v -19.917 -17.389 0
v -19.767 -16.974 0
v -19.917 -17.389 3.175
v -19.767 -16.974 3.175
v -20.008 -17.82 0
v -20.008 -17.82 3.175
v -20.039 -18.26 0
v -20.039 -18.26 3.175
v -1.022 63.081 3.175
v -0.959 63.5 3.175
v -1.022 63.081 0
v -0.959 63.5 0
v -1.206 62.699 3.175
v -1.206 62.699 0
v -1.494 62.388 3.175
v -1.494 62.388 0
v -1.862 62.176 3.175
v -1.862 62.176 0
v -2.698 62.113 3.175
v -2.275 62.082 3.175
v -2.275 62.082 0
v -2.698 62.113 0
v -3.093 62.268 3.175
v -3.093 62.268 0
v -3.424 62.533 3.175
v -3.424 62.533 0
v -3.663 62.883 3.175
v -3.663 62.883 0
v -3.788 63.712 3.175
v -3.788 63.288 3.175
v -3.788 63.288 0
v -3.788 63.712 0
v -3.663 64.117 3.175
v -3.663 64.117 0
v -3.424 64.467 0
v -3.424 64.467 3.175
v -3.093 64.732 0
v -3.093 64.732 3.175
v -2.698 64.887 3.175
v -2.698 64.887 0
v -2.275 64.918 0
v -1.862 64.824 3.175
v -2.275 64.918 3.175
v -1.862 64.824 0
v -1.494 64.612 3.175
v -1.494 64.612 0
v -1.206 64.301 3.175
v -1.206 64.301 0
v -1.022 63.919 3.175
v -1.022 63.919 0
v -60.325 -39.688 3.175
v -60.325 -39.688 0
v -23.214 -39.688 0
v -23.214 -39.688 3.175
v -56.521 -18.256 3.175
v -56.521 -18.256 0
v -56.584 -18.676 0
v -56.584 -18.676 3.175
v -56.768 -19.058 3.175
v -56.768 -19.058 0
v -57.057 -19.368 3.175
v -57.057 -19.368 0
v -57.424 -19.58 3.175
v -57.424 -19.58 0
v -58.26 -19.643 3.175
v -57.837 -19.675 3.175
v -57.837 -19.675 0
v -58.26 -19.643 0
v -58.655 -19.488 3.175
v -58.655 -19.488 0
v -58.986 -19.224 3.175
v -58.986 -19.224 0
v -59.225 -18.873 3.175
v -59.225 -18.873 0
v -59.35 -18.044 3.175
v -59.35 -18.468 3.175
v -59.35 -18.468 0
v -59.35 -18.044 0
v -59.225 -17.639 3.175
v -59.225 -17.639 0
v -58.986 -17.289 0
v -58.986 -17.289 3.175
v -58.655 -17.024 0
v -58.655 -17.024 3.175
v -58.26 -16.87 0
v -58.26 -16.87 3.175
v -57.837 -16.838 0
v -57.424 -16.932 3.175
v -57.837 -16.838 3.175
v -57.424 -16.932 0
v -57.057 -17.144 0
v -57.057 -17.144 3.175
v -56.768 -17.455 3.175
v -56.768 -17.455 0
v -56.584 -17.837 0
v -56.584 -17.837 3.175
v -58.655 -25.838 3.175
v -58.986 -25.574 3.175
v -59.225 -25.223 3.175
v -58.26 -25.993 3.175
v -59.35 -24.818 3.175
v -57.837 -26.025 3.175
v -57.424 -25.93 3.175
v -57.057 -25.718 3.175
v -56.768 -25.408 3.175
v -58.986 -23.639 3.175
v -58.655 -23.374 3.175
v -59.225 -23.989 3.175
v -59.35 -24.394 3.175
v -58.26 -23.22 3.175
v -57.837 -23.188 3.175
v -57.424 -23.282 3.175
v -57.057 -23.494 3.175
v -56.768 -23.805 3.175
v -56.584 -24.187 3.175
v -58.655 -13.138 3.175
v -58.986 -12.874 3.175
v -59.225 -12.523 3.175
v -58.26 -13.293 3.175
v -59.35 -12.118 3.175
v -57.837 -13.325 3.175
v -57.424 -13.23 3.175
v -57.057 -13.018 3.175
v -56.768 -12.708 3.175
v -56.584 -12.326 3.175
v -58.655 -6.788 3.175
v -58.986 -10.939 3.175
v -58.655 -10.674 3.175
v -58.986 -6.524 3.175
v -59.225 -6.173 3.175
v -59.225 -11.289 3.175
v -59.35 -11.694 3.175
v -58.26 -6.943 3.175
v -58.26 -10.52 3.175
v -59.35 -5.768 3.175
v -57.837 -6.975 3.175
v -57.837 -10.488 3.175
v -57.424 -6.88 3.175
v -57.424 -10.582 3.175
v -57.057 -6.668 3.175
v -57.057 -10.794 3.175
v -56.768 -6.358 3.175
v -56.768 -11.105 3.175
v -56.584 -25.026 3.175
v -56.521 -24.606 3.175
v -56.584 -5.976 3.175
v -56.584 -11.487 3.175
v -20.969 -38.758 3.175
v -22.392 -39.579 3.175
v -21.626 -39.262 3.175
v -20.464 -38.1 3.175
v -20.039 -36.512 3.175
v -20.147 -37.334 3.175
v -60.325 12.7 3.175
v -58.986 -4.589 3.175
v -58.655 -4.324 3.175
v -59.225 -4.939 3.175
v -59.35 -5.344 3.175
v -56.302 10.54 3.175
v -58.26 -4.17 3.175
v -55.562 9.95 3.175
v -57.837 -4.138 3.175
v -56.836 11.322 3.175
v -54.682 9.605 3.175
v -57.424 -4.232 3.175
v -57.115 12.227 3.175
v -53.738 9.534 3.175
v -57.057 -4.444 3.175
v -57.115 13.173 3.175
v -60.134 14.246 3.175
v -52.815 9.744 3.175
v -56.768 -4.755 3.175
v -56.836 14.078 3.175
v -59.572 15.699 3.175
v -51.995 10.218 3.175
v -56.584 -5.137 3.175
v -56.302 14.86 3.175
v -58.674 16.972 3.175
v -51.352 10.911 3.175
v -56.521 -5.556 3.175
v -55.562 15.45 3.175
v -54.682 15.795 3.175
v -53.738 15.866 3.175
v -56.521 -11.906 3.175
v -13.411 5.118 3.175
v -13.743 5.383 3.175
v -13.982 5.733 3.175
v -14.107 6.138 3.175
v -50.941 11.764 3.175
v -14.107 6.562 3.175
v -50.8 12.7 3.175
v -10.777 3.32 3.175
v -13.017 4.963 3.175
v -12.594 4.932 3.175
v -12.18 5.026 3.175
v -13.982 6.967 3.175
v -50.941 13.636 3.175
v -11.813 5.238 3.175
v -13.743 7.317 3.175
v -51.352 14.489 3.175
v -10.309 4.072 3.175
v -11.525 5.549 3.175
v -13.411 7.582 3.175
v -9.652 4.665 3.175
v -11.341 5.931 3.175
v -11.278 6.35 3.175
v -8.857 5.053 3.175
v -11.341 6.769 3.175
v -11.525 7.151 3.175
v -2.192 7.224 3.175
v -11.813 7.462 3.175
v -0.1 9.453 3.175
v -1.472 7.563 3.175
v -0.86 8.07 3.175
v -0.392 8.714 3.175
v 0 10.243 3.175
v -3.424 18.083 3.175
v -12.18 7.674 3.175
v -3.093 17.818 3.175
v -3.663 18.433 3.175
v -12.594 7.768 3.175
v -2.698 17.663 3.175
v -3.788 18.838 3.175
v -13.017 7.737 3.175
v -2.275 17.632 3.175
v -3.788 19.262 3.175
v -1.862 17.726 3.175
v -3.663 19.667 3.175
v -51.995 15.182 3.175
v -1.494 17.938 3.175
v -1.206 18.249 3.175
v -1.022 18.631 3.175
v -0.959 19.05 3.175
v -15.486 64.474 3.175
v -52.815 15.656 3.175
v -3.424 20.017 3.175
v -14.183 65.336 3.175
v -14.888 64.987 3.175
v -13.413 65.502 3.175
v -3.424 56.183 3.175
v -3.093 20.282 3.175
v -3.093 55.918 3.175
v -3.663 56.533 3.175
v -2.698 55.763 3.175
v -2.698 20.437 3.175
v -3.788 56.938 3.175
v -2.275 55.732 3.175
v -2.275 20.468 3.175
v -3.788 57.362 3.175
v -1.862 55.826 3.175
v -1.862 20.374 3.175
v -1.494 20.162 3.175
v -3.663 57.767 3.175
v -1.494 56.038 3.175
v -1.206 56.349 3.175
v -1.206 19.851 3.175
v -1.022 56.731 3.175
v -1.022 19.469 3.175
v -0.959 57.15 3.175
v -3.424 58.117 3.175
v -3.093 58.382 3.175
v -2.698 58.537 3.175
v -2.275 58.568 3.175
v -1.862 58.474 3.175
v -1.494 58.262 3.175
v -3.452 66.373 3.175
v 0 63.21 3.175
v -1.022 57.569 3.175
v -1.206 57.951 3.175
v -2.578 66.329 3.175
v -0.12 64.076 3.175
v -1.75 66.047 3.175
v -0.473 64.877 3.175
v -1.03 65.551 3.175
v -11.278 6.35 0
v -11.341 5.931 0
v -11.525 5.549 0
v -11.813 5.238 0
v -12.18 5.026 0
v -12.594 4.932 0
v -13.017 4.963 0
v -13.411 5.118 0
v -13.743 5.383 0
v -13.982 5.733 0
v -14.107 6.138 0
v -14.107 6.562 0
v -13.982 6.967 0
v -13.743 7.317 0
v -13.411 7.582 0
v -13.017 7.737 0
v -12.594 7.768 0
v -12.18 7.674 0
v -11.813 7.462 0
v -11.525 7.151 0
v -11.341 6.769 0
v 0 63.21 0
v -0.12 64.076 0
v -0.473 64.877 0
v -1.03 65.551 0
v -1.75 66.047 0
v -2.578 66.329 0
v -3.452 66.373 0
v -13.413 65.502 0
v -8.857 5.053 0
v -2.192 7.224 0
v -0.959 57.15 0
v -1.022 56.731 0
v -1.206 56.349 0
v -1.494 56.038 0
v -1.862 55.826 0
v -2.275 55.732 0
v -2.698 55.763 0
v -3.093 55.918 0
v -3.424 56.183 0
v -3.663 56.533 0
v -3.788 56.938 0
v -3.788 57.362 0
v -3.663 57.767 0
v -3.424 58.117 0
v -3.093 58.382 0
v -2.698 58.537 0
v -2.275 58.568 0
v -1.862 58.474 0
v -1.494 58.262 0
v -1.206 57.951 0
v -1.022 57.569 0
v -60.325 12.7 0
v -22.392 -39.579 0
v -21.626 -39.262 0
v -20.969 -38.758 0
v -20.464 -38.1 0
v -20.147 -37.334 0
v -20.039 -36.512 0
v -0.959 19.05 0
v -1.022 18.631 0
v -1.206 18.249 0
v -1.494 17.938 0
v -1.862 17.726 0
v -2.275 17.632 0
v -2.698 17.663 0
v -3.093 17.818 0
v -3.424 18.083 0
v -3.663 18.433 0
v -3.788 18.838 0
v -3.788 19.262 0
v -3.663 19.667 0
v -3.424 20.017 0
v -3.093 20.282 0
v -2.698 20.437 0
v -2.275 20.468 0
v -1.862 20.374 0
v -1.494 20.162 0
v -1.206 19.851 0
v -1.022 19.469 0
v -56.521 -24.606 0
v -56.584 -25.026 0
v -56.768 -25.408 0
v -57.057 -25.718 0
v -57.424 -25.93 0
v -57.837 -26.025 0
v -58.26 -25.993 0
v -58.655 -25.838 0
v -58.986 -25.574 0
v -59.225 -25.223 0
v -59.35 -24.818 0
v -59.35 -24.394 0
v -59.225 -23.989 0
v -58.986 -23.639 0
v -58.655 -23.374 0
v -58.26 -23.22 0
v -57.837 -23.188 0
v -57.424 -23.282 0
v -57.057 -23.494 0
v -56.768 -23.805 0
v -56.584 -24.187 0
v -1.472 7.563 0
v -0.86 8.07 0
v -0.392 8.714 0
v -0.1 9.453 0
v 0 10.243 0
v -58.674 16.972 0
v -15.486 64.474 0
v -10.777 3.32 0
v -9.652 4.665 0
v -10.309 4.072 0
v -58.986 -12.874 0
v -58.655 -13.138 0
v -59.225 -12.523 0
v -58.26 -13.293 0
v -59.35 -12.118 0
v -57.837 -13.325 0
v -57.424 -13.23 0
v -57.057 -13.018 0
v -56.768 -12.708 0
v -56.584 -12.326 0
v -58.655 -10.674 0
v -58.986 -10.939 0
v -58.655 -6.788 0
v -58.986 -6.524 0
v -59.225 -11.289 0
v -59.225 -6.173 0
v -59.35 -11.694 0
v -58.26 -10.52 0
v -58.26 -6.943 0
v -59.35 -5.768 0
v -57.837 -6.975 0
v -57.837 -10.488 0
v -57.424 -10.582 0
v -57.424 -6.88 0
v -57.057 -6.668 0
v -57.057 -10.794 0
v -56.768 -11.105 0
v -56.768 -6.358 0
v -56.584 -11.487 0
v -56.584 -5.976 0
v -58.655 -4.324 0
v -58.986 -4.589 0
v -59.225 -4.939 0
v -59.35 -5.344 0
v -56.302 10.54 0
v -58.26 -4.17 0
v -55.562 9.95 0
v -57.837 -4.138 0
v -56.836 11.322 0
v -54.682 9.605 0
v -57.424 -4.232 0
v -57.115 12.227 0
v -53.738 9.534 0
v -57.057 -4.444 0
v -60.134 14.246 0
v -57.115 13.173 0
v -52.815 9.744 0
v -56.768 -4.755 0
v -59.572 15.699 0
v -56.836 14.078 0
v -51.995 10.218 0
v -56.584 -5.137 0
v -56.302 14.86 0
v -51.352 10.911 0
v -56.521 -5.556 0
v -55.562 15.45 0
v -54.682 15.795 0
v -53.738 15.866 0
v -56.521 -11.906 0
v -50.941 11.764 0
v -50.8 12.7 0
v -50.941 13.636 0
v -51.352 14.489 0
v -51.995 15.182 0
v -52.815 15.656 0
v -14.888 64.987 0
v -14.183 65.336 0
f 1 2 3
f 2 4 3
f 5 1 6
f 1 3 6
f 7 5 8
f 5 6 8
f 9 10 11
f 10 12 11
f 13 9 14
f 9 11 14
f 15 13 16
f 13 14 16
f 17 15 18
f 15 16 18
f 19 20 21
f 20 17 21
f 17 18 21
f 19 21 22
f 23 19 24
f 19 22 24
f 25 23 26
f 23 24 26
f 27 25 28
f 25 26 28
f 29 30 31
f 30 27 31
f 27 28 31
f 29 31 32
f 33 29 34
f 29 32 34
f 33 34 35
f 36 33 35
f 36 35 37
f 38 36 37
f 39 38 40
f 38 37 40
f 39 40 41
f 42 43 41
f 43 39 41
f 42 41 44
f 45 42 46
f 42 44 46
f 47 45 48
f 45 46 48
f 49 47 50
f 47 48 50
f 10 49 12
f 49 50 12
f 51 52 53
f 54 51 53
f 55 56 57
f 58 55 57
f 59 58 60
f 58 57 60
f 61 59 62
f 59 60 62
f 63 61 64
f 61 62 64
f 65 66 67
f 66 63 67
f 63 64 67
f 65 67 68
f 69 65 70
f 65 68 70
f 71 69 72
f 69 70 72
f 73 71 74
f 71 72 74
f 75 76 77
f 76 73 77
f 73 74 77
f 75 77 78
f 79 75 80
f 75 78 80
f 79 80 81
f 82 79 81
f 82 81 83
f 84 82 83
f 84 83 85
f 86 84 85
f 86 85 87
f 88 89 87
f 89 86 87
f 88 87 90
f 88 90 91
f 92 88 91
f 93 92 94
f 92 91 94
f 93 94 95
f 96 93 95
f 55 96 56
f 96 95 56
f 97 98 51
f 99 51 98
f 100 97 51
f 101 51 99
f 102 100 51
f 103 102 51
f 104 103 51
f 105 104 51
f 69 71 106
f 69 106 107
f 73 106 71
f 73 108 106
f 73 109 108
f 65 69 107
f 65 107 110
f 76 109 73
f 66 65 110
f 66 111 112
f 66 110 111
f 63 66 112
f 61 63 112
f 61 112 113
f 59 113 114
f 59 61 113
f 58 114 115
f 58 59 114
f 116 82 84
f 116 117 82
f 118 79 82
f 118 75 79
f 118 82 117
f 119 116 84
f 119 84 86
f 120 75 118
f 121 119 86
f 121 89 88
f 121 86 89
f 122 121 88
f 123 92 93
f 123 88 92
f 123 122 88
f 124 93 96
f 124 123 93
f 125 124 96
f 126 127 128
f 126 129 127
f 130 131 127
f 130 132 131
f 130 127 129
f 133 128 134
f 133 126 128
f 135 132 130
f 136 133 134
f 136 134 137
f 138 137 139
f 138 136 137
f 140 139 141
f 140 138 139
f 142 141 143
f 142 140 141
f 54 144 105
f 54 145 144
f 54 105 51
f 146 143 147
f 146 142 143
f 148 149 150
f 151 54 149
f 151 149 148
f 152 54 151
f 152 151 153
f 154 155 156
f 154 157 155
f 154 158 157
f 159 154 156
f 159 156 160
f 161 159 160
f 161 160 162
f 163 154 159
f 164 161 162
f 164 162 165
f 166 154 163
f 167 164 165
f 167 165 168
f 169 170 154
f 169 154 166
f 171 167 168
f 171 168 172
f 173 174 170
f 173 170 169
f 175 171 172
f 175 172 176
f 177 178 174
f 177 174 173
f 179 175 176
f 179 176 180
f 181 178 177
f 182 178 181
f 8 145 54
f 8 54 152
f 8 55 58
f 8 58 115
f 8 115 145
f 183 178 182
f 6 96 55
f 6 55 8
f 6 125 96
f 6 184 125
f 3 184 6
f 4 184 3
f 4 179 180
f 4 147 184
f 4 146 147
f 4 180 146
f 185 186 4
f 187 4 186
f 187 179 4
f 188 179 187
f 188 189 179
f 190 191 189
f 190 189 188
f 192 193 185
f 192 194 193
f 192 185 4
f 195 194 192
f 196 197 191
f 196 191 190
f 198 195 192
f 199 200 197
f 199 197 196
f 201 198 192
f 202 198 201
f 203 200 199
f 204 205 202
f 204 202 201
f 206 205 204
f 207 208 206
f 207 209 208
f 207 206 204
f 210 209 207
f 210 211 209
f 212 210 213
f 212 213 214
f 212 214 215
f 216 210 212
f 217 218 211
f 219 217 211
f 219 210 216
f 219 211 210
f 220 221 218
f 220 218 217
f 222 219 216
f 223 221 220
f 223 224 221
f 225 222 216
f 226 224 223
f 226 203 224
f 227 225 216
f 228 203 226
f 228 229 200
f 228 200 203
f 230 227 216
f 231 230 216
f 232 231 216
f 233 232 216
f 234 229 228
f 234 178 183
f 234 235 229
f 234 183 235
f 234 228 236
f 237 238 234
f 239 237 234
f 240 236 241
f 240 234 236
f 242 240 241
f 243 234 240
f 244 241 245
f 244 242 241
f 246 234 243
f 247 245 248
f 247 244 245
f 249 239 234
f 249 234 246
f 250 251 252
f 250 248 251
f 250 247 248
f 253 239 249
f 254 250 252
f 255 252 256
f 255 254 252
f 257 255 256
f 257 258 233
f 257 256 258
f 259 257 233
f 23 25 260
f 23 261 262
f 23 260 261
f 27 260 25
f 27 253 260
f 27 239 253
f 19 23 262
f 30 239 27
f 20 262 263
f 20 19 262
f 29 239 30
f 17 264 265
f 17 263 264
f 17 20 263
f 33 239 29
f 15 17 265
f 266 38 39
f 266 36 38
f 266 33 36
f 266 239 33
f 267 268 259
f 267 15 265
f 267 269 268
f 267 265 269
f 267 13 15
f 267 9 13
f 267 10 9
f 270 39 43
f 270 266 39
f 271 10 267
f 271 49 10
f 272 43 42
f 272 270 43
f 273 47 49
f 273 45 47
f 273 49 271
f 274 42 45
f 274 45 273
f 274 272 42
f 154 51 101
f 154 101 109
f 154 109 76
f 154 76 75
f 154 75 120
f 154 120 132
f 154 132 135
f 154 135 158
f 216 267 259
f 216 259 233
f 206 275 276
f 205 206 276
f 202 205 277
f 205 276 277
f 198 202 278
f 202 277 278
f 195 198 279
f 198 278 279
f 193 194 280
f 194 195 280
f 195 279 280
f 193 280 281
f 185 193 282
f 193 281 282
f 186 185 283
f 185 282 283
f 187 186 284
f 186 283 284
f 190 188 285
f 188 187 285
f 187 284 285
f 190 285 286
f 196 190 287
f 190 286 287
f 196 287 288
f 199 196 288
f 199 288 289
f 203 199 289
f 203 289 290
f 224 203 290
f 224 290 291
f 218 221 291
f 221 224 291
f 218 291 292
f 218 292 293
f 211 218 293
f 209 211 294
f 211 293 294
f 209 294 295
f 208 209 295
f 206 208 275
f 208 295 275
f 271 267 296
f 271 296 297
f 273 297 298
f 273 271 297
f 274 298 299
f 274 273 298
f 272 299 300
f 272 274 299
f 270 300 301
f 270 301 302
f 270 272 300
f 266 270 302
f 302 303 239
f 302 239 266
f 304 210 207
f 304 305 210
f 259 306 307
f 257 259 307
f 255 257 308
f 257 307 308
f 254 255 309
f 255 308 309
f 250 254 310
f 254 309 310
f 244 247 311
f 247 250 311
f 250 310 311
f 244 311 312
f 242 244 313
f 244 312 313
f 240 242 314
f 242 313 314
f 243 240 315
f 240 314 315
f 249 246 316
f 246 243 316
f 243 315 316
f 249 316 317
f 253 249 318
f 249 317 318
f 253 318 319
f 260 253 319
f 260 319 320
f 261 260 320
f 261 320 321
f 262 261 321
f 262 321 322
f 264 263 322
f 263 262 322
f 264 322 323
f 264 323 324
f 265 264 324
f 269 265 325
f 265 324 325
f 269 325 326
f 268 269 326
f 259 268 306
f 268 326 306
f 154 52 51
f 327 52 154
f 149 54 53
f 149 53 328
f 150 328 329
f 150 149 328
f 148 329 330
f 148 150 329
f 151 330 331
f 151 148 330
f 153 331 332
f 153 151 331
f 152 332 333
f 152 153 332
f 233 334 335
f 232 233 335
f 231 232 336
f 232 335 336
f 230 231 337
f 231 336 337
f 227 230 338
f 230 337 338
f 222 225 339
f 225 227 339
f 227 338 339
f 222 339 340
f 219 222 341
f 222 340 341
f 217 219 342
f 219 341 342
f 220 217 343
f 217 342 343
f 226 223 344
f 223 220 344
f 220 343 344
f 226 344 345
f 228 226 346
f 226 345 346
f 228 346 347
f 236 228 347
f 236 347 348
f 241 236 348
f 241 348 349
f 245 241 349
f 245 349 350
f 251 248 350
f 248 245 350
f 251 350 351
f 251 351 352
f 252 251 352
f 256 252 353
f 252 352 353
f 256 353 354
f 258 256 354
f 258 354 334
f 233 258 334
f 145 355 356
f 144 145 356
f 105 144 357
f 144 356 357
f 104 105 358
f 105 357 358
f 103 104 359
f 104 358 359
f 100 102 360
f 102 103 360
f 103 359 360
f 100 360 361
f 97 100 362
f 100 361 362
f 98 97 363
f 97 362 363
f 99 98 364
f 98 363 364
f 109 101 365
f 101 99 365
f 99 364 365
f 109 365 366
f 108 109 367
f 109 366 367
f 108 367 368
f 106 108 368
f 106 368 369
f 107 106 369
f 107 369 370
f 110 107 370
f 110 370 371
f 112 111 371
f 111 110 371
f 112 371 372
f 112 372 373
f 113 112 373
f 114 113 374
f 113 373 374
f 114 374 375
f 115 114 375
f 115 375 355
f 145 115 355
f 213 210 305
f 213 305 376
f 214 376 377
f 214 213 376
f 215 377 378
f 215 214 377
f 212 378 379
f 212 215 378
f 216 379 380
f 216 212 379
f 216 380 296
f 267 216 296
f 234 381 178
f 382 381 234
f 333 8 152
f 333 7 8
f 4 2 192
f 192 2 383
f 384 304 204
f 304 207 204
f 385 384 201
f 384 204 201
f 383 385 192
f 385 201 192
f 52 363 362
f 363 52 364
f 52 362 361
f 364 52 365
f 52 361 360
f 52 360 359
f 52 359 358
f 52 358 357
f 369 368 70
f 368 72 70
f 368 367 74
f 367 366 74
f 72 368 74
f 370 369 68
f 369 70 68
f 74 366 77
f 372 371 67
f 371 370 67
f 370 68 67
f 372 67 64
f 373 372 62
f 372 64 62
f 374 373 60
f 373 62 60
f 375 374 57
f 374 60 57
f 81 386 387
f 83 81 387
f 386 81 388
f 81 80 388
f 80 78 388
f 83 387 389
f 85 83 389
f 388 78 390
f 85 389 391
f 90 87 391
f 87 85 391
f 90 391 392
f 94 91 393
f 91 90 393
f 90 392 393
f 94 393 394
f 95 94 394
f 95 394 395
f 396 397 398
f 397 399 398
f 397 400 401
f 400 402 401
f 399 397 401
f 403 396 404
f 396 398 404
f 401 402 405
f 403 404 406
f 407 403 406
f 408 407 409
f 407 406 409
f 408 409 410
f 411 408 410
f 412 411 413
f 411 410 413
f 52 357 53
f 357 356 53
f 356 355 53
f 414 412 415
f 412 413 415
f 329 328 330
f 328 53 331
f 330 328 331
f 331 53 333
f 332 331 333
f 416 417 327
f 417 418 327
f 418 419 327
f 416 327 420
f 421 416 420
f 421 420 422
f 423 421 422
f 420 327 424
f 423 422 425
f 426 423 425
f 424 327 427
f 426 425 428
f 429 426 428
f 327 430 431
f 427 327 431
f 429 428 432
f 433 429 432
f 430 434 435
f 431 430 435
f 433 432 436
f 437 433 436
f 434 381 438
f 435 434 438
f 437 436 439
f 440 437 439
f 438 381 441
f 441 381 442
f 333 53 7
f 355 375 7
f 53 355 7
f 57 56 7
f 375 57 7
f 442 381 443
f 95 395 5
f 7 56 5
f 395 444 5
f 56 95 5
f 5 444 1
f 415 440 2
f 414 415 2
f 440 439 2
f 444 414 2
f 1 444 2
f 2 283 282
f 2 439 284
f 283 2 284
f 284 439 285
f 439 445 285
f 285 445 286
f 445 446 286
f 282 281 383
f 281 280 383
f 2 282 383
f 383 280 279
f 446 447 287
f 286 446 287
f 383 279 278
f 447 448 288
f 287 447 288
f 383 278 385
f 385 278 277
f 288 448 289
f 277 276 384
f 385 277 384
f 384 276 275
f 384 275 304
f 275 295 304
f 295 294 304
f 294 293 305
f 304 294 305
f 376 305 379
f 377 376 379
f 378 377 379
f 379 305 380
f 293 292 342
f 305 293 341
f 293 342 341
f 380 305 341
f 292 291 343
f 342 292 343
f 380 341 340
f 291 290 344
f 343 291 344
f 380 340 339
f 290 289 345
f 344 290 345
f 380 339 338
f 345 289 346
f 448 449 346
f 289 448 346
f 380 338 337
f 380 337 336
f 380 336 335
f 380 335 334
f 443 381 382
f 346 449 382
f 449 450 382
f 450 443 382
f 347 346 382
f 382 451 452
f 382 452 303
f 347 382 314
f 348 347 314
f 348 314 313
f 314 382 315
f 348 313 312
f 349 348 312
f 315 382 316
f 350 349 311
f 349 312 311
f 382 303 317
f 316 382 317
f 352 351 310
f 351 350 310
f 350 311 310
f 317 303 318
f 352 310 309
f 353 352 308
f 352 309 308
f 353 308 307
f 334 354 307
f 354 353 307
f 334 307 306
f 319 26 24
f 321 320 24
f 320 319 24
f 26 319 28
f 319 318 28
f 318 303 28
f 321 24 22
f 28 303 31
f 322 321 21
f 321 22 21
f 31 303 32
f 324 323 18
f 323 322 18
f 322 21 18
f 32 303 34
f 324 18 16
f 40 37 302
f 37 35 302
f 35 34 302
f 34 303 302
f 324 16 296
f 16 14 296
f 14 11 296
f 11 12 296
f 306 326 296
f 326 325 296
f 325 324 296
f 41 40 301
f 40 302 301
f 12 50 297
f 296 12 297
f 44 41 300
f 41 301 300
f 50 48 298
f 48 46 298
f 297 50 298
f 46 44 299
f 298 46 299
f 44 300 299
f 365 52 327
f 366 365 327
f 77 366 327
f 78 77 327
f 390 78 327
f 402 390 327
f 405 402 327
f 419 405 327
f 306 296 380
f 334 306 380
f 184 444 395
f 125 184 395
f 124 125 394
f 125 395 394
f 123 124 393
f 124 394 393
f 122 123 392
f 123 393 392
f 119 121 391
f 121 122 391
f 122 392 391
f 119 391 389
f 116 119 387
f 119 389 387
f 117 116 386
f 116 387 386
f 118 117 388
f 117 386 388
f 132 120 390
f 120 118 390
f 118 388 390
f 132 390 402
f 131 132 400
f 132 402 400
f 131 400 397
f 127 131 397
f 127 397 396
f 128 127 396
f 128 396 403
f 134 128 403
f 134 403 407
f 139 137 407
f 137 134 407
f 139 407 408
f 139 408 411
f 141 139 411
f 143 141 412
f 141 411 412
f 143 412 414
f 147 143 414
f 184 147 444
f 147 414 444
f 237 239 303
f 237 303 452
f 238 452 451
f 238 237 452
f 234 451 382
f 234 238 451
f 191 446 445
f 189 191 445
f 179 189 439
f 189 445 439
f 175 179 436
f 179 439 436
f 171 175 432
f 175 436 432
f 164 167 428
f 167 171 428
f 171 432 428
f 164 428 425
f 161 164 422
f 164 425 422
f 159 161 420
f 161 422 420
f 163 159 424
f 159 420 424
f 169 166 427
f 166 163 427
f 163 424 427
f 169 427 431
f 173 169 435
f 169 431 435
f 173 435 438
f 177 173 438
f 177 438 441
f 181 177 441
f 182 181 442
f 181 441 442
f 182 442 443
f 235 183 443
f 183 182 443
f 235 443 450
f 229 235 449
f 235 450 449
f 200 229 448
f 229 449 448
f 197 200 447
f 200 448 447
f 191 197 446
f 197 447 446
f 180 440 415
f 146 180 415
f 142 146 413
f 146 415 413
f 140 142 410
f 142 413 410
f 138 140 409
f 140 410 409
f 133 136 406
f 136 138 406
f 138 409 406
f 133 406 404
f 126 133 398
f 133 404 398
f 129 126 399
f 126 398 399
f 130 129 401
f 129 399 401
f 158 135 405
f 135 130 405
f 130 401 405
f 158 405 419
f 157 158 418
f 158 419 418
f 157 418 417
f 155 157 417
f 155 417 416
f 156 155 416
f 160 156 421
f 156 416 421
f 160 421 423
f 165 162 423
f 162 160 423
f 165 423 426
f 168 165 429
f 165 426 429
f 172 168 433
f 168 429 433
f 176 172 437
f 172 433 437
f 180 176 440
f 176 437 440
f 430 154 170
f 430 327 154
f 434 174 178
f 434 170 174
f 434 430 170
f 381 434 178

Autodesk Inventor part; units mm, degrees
ref_plane "YZ Plane" through (0, 0, 0) normal (1, 0, 0) x (0, 1, 0)
ref_plane "XZ Plane" through (0, 0, 0) normal (0, 1, 0) x (-1, 0, 0)
ref_plane "XY Plane" through (0, 0, 0) normal (0, 0, 1) x (1, 0, 0)
sketch "Sketch1" plane through (0, 0, 0) normal (0, 0, 1) x (1, 0, 0)
  line L0 (0, 0) -> (0, 136.525)
  line L1 (-11.7886, 12.2907) -> (-39.6863, 18.4755) construction
  line L2 (-39.6863, 18.4755) -> (-33.3297, 47.1481) construction
  line L3 (-33.3297, 47.1481) -> (-5.432, 40.9633) construction
  line L4 (-5.432, 40.9633) -> (-11.7886, 12.2907) construction
  line L5 (-39.6863, 18.4755) -> (-5.432, 40.9633) construction
  line L6 (-33.3297, 47.1481) -> (-11.7886, 12.2907) construction
  circle A0 centre (-53.975, 12.7) radius 3.175
  circle A1 centre (-53.975, 12.7) radius 6.35
  line L7 (0, 0) -> (-54.712, 6.3929) construction
  line L8 (-59.6703, 15.5082) -> (0, 136.525) construction
  line L9 (-27.1302, 45.7737) -> (-37.4529, 28.5497) construction
  line L10 (-11.6315, 42.3377) -> (-9.5552, 22.3649) construction
  line L11 (-19.3809, 44.0557) -> (-25.7374, 15.3831) construction
  line L12 (0, 92.075) -> (-19.7574, 96.4551) construction
  line L13 (-35.3766, 8.5768) -> (-19.8779, 5.1408) construction
  line L14 (-19.8779, 5.1408) -> (-21.2523, -1.0586) construction
  line L15 (-21.2523, -1.0586) -> (-36.751, 2.3773) construction
  line L16 (-36.751, 2.3773) -> (-35.3766, 8.5768) construction
  line L17 (-35.3766, 8.5768) -> (-41.27, 4.8223) construction
  line L18 (-19.8779, 5.1408) -> (-17.9381, 2.096) construction
  line L19 (-5.432, 40.9633) -> (-33.3297, 47.1481) construction
  line L20 (-33.3297, 47.1481) -> (-32.2475, 52.0296) construction
  line L21 (-32.2475, 52.0296) -> (-4.3498, 45.8448) construction
  line L22 (-4.3498, 45.8448) -> (-5.432, 40.9633) construction
  line L23 (-53.2878, 15.7997) -> (-53.975, 12.7) construction
  line L24 (-53.975, 12.7) -> (-57.0747, 13.3872) construction
  line L25 (-27.6272, 6.8588) -> (-34.4992, -24.1386) construction
  line L26 (-31.8676, 50.076) -> (-5.5198, 44.2349) construction
  line L27 (-5.5198, 44.2349) -> (-4.489, 48.8845) construction
  line L28 (-4.489, 48.8845) -> (-30.8368, 54.7256) construction
  line L29 (-30.8368, 54.7256) -> (-31.8676, 50.076) construction
  line L30 (-31.3522, 52.4008) -> (-5.0044, 46.5597) construction
  circle A2 centre (-29.0274, 51.8854) radius 1.4732 construction
  circle A3 centre (-22.8279, 50.5111) radius 1.4732 construction
  circle A4 centre (-16.6284, 49.1367) radius 1.4732 construction
  circle A5 centre (-10.4289, 47.7623) radius 1.4732 construction
  circle A6 centre (-10.3614, 84.7398) radius 1.4732 construction
  line L31 (-53.975, 12.7) -> (-13.3751, 95.0402) construction
  line L32 (-32.2923, 56.6744) -> (0, 49.5153) construction
  circle A7 centre (-10.3614, 84.7398) radius 4.7625 construction
  line L33 (-4.7625, 50.5712) -> (-4.7625, 93.1308) construction
  line L34 (-27.5056, 55.6132) -> (-14.3936, 82.2055) construction
  line L35 (-5.6003, 84.6261) -> (-4.7625, 84.4403) construction
  line L36 (-17.9381, 2.096) -> (0, 2.096) construction
  line L37 (0, 2.096) -> (0, -1.079) construction
  line L38 (0, -1.079) -> (-17.9381, -1.079) construction
  line L39 (-17.9381, -1.079) -> (-17.9381, 2.096) construction
  circle A8 centre (-12.7, 7.9375) radius 1.5875 construction
  line L40 (-12.7, 7.9375) -> (0, 7.9375) construction
  line L41 (0, 7.9375) -> (-17.9381, 2.096)
  circle A9 centre (-12.7, 7.9375) radius 3.175 construction
  line L42 (-9.525, 7.9375) -> (-9.525, 4.8357) construction
  line L43 (-9.525, 7.9375) -> (0, 7.9375) construction
  line L44 (-17.9187, 46.9837) -> (-16.8879, 51.6333) construction
  line L45 (-12.4942, 45.7811) -> (-26.2381, -16.2137) construction
  line L46 (0, 66.675) -> (0, 7.9375) construction
  line L47 (-26.2381, -16.2137) -> (-20.0386, -17.5881) construction
  line L48 (-20.0386, -17.5881) -> (-8.7313, 7.9375)
  circle A10 centre (-12.7, 6.35) radius 1.4224
  line L49 (0, 13.4938) -> (-4.7625, 13.4938) construction
  line L50 (-4.7625, 13.4938) -> (-4.7625, 24.6063) construction
  line L51 (-4.7625, 24.6063) -> (0, 24.6063) construction
  line L52 (0, 24.6063) -> (0, 13.4938) construction
  line L53 (-4.7625, 19.05) -> (0, 19.05) construction
  circle A11 centre (-2.3813, 19.05) radius 1.4224
  line L54 (-20.7405, 8.5842) -> (-9.7454, 58.18) construction
  line L55 (-9.7454, 58.18) -> (-3.5459, 56.8056) construction
  line L56 (-3.5459, 56.8056) -> (-14.5411, 7.2098) construction
  line L57 (-14.5411, 7.2098) -> (-20.7405, 8.5842) construction
  line L58 (-12.7, 6.35) -> (-12.7, 7.9375) construction
  line L59 (-11.5442, 1.5875) -> (-9.525, 1.5875) construction
  line L60 (-9.525, 1.5875) -> (-9.525, 7.9375) construction
  line L61 (-9.525, 7.9375) -> (-11.5442, 7.9375) construction
  line L62 (-11.5442, 7.9375) -> (-11.5442, 1.5875) construction
  line L63 (-9.7454, 58.18) -> (-15.9449, 59.5544) construction
  line L64 (-15.9449, 59.5544) -> (-14.6504, 65.3933) construction
  line L65 (-14.6504, 65.3933) -> (0, 66.675)
  line L66 (-9.7454, 58.18) -> (-17.3193, 53.3549) construction
  arc A12 (-10.2313, 55.9882) -> (-11.9373, 58.6659) centre (-11.0843, 57.3271) ccw construction
  line L67 (-4.7625, 57.15) -> (0, 57.15) construction
  circle A13 centre (-2.3813, 57.15) radius 1.4224
  circle A14 centre (-2.3813, 63.5) radius 1.4224
  line L68 (0, 7.9375) -> (-60.325, 7.9375) construction
  line L69 (-60.325, 7.9375) -> (-60.325, -39.6875) construction
  line L70 (-60.325, -39.6875) -> (0, -39.6875)
  line L71 (0, -39.6875) -> (0, 7.9375)
  line L72 (-60.325, -39.6875) -> (-60.325, 12.7)
  line L73 (-58.6735, 16.9717) -> (-14.6504, 65.3933)
  line L74 (-60.325, -30.1625) -> (-60.325, -3.175) construction
  line L75 (-60.325, -3.175) -> (-55.5625, -3.175) construction
  line L76 (-55.5625, -3.175) -> (-55.5625, -30.1625) construction
  line L77 (-55.5625, -30.1625) -> (-60.325, -30.1625) construction
  line L78 (-60.325, -24.6062) -> (-55.5625, -24.6062) construction
  circle A15 centre (-57.9437, -24.6063) radius 1.4224
  circle A16 centre (-57.9437, -18.2563) radius 1.4224
  circle A17 centre (-57.9437, -11.9063) radius 1.4224
  circle A18 centre (-57.9437, -5.5563) radius 1.4224
  line L79 (-20.0386, -17.5881) -> (-20.0386, -39.6875)
  point P0 (-22.5591, 29.7194)
  point P1 (-20.4869, 2.3938)
  point P2 (-36.3367, 4.2458)
  point P3 (-51.1668, 18.3953)
  point P4 (-11.1125, 7.9375)
  point P5 (-11.4283, 6.9872)
  point P6 (-11.9574, 7.9375)
  point P7 (-13.9717, 6.9872)
  point P8 (-9.525, 6.1457)
  point P9 (-10.2031, 4.6149)
  dimension "d74" = 6.35
  dimension "d13" = 136.525
  dimension "d14" = 29.3687
  dimension "d15" = 28.575
  dimension "d16" = 12.5
  dimension "d17" = 6.35
  dimension "d19" = 53.975
  dimension "d22" = 12.7
  dimension "d23" = 7.9375
  dimension "d24" = 19.05
  dimension "d26" = 102.5
  dimension "d29" = 6.35
  dimension "d31" = 7.9375
  dimension "d34" = 5
  dimension "d35" = 26.9875
  dimension "d38" = 31.75
  dimension "d40" = 26.9875
  dimension "d41" = 4.7625
  dimension "d42" = 2.9464
  dimension "d43" = 2.3813
  dimension "d46" = 6.35
  dimension "d51" = 2.9464
  dimension "d52" = 79.7719
  dimension "d53" = 6.35
  dimension "d54" = 9.525
  dimension "d55" = 4.7625
  dimension "d56" = 4.7625
  dimension "d60" = 12.7
  dimension "d61" = 3.175
  dimension "d63" = 3.175
  dimension "d66" = 3.175
  dimension "d67" = 12.7
  dimension "d72" = 8.7312
  dimension "d73" = 7.9375
  dimension "d75" = 34.925
  dimension "d80" = 12.7
  dimension "d82" = 7.9375
  dimension "d83" = 63.5
  dimension "d84" = 66.675
  dimension "d85" = 6.35
  dimension "d86" = 92.075
  dimension "d87" = 2.8448
  dimension "d88" = 4.7625
  dimension "d89" = 11.1125
  dimension "d90" = 2.8448
  dimension "d91" = 19.05
  dimension "d92" = 6.35
  dimension "d93" = 50.8
  dimension "d94" = 25.4
  dimension "d95" = 8.7312
  dimension "d96" = 9.525
  dimension "d97" = 6.35
  dimension "d99" = 6.35
  dimension "d101" = 3.175
  dimension "d106" = 2.8448
  dimension "d107" = 57.15
  dimension "d110" = 6.35
  dimension "d119" = 85
  dimension "d121" = 47.625
  dimension "d123" = 4.7625
  dimension "d124" = 26.9875
  dimension "d125" = 9.525
  dimension "d126" = 2.8448
  dimension "d130" = 6.35
  dimension "d135" = 2.3813
extrude "Extrusion1" add sketch "Sketch1" along normal blind 3.175 contours L41 L48 L79 L70 L72 A1 L73 L65 L0 | A1
fillet "Fillet5" radius 3.175 6 edges at (-14.6504, 65.3933, 1.5875) (0, 66.675, 1.5875) (-20.0386, -39.6875, 1.5875) (-20.0386, -17.5881, 1.5875) (-10.2031, 4.6149, 1.5875) (0, 7.9375, 1.5875)
equation "\"d56\" = d55"
properties part number "Uprights" material "UHMW, White"
